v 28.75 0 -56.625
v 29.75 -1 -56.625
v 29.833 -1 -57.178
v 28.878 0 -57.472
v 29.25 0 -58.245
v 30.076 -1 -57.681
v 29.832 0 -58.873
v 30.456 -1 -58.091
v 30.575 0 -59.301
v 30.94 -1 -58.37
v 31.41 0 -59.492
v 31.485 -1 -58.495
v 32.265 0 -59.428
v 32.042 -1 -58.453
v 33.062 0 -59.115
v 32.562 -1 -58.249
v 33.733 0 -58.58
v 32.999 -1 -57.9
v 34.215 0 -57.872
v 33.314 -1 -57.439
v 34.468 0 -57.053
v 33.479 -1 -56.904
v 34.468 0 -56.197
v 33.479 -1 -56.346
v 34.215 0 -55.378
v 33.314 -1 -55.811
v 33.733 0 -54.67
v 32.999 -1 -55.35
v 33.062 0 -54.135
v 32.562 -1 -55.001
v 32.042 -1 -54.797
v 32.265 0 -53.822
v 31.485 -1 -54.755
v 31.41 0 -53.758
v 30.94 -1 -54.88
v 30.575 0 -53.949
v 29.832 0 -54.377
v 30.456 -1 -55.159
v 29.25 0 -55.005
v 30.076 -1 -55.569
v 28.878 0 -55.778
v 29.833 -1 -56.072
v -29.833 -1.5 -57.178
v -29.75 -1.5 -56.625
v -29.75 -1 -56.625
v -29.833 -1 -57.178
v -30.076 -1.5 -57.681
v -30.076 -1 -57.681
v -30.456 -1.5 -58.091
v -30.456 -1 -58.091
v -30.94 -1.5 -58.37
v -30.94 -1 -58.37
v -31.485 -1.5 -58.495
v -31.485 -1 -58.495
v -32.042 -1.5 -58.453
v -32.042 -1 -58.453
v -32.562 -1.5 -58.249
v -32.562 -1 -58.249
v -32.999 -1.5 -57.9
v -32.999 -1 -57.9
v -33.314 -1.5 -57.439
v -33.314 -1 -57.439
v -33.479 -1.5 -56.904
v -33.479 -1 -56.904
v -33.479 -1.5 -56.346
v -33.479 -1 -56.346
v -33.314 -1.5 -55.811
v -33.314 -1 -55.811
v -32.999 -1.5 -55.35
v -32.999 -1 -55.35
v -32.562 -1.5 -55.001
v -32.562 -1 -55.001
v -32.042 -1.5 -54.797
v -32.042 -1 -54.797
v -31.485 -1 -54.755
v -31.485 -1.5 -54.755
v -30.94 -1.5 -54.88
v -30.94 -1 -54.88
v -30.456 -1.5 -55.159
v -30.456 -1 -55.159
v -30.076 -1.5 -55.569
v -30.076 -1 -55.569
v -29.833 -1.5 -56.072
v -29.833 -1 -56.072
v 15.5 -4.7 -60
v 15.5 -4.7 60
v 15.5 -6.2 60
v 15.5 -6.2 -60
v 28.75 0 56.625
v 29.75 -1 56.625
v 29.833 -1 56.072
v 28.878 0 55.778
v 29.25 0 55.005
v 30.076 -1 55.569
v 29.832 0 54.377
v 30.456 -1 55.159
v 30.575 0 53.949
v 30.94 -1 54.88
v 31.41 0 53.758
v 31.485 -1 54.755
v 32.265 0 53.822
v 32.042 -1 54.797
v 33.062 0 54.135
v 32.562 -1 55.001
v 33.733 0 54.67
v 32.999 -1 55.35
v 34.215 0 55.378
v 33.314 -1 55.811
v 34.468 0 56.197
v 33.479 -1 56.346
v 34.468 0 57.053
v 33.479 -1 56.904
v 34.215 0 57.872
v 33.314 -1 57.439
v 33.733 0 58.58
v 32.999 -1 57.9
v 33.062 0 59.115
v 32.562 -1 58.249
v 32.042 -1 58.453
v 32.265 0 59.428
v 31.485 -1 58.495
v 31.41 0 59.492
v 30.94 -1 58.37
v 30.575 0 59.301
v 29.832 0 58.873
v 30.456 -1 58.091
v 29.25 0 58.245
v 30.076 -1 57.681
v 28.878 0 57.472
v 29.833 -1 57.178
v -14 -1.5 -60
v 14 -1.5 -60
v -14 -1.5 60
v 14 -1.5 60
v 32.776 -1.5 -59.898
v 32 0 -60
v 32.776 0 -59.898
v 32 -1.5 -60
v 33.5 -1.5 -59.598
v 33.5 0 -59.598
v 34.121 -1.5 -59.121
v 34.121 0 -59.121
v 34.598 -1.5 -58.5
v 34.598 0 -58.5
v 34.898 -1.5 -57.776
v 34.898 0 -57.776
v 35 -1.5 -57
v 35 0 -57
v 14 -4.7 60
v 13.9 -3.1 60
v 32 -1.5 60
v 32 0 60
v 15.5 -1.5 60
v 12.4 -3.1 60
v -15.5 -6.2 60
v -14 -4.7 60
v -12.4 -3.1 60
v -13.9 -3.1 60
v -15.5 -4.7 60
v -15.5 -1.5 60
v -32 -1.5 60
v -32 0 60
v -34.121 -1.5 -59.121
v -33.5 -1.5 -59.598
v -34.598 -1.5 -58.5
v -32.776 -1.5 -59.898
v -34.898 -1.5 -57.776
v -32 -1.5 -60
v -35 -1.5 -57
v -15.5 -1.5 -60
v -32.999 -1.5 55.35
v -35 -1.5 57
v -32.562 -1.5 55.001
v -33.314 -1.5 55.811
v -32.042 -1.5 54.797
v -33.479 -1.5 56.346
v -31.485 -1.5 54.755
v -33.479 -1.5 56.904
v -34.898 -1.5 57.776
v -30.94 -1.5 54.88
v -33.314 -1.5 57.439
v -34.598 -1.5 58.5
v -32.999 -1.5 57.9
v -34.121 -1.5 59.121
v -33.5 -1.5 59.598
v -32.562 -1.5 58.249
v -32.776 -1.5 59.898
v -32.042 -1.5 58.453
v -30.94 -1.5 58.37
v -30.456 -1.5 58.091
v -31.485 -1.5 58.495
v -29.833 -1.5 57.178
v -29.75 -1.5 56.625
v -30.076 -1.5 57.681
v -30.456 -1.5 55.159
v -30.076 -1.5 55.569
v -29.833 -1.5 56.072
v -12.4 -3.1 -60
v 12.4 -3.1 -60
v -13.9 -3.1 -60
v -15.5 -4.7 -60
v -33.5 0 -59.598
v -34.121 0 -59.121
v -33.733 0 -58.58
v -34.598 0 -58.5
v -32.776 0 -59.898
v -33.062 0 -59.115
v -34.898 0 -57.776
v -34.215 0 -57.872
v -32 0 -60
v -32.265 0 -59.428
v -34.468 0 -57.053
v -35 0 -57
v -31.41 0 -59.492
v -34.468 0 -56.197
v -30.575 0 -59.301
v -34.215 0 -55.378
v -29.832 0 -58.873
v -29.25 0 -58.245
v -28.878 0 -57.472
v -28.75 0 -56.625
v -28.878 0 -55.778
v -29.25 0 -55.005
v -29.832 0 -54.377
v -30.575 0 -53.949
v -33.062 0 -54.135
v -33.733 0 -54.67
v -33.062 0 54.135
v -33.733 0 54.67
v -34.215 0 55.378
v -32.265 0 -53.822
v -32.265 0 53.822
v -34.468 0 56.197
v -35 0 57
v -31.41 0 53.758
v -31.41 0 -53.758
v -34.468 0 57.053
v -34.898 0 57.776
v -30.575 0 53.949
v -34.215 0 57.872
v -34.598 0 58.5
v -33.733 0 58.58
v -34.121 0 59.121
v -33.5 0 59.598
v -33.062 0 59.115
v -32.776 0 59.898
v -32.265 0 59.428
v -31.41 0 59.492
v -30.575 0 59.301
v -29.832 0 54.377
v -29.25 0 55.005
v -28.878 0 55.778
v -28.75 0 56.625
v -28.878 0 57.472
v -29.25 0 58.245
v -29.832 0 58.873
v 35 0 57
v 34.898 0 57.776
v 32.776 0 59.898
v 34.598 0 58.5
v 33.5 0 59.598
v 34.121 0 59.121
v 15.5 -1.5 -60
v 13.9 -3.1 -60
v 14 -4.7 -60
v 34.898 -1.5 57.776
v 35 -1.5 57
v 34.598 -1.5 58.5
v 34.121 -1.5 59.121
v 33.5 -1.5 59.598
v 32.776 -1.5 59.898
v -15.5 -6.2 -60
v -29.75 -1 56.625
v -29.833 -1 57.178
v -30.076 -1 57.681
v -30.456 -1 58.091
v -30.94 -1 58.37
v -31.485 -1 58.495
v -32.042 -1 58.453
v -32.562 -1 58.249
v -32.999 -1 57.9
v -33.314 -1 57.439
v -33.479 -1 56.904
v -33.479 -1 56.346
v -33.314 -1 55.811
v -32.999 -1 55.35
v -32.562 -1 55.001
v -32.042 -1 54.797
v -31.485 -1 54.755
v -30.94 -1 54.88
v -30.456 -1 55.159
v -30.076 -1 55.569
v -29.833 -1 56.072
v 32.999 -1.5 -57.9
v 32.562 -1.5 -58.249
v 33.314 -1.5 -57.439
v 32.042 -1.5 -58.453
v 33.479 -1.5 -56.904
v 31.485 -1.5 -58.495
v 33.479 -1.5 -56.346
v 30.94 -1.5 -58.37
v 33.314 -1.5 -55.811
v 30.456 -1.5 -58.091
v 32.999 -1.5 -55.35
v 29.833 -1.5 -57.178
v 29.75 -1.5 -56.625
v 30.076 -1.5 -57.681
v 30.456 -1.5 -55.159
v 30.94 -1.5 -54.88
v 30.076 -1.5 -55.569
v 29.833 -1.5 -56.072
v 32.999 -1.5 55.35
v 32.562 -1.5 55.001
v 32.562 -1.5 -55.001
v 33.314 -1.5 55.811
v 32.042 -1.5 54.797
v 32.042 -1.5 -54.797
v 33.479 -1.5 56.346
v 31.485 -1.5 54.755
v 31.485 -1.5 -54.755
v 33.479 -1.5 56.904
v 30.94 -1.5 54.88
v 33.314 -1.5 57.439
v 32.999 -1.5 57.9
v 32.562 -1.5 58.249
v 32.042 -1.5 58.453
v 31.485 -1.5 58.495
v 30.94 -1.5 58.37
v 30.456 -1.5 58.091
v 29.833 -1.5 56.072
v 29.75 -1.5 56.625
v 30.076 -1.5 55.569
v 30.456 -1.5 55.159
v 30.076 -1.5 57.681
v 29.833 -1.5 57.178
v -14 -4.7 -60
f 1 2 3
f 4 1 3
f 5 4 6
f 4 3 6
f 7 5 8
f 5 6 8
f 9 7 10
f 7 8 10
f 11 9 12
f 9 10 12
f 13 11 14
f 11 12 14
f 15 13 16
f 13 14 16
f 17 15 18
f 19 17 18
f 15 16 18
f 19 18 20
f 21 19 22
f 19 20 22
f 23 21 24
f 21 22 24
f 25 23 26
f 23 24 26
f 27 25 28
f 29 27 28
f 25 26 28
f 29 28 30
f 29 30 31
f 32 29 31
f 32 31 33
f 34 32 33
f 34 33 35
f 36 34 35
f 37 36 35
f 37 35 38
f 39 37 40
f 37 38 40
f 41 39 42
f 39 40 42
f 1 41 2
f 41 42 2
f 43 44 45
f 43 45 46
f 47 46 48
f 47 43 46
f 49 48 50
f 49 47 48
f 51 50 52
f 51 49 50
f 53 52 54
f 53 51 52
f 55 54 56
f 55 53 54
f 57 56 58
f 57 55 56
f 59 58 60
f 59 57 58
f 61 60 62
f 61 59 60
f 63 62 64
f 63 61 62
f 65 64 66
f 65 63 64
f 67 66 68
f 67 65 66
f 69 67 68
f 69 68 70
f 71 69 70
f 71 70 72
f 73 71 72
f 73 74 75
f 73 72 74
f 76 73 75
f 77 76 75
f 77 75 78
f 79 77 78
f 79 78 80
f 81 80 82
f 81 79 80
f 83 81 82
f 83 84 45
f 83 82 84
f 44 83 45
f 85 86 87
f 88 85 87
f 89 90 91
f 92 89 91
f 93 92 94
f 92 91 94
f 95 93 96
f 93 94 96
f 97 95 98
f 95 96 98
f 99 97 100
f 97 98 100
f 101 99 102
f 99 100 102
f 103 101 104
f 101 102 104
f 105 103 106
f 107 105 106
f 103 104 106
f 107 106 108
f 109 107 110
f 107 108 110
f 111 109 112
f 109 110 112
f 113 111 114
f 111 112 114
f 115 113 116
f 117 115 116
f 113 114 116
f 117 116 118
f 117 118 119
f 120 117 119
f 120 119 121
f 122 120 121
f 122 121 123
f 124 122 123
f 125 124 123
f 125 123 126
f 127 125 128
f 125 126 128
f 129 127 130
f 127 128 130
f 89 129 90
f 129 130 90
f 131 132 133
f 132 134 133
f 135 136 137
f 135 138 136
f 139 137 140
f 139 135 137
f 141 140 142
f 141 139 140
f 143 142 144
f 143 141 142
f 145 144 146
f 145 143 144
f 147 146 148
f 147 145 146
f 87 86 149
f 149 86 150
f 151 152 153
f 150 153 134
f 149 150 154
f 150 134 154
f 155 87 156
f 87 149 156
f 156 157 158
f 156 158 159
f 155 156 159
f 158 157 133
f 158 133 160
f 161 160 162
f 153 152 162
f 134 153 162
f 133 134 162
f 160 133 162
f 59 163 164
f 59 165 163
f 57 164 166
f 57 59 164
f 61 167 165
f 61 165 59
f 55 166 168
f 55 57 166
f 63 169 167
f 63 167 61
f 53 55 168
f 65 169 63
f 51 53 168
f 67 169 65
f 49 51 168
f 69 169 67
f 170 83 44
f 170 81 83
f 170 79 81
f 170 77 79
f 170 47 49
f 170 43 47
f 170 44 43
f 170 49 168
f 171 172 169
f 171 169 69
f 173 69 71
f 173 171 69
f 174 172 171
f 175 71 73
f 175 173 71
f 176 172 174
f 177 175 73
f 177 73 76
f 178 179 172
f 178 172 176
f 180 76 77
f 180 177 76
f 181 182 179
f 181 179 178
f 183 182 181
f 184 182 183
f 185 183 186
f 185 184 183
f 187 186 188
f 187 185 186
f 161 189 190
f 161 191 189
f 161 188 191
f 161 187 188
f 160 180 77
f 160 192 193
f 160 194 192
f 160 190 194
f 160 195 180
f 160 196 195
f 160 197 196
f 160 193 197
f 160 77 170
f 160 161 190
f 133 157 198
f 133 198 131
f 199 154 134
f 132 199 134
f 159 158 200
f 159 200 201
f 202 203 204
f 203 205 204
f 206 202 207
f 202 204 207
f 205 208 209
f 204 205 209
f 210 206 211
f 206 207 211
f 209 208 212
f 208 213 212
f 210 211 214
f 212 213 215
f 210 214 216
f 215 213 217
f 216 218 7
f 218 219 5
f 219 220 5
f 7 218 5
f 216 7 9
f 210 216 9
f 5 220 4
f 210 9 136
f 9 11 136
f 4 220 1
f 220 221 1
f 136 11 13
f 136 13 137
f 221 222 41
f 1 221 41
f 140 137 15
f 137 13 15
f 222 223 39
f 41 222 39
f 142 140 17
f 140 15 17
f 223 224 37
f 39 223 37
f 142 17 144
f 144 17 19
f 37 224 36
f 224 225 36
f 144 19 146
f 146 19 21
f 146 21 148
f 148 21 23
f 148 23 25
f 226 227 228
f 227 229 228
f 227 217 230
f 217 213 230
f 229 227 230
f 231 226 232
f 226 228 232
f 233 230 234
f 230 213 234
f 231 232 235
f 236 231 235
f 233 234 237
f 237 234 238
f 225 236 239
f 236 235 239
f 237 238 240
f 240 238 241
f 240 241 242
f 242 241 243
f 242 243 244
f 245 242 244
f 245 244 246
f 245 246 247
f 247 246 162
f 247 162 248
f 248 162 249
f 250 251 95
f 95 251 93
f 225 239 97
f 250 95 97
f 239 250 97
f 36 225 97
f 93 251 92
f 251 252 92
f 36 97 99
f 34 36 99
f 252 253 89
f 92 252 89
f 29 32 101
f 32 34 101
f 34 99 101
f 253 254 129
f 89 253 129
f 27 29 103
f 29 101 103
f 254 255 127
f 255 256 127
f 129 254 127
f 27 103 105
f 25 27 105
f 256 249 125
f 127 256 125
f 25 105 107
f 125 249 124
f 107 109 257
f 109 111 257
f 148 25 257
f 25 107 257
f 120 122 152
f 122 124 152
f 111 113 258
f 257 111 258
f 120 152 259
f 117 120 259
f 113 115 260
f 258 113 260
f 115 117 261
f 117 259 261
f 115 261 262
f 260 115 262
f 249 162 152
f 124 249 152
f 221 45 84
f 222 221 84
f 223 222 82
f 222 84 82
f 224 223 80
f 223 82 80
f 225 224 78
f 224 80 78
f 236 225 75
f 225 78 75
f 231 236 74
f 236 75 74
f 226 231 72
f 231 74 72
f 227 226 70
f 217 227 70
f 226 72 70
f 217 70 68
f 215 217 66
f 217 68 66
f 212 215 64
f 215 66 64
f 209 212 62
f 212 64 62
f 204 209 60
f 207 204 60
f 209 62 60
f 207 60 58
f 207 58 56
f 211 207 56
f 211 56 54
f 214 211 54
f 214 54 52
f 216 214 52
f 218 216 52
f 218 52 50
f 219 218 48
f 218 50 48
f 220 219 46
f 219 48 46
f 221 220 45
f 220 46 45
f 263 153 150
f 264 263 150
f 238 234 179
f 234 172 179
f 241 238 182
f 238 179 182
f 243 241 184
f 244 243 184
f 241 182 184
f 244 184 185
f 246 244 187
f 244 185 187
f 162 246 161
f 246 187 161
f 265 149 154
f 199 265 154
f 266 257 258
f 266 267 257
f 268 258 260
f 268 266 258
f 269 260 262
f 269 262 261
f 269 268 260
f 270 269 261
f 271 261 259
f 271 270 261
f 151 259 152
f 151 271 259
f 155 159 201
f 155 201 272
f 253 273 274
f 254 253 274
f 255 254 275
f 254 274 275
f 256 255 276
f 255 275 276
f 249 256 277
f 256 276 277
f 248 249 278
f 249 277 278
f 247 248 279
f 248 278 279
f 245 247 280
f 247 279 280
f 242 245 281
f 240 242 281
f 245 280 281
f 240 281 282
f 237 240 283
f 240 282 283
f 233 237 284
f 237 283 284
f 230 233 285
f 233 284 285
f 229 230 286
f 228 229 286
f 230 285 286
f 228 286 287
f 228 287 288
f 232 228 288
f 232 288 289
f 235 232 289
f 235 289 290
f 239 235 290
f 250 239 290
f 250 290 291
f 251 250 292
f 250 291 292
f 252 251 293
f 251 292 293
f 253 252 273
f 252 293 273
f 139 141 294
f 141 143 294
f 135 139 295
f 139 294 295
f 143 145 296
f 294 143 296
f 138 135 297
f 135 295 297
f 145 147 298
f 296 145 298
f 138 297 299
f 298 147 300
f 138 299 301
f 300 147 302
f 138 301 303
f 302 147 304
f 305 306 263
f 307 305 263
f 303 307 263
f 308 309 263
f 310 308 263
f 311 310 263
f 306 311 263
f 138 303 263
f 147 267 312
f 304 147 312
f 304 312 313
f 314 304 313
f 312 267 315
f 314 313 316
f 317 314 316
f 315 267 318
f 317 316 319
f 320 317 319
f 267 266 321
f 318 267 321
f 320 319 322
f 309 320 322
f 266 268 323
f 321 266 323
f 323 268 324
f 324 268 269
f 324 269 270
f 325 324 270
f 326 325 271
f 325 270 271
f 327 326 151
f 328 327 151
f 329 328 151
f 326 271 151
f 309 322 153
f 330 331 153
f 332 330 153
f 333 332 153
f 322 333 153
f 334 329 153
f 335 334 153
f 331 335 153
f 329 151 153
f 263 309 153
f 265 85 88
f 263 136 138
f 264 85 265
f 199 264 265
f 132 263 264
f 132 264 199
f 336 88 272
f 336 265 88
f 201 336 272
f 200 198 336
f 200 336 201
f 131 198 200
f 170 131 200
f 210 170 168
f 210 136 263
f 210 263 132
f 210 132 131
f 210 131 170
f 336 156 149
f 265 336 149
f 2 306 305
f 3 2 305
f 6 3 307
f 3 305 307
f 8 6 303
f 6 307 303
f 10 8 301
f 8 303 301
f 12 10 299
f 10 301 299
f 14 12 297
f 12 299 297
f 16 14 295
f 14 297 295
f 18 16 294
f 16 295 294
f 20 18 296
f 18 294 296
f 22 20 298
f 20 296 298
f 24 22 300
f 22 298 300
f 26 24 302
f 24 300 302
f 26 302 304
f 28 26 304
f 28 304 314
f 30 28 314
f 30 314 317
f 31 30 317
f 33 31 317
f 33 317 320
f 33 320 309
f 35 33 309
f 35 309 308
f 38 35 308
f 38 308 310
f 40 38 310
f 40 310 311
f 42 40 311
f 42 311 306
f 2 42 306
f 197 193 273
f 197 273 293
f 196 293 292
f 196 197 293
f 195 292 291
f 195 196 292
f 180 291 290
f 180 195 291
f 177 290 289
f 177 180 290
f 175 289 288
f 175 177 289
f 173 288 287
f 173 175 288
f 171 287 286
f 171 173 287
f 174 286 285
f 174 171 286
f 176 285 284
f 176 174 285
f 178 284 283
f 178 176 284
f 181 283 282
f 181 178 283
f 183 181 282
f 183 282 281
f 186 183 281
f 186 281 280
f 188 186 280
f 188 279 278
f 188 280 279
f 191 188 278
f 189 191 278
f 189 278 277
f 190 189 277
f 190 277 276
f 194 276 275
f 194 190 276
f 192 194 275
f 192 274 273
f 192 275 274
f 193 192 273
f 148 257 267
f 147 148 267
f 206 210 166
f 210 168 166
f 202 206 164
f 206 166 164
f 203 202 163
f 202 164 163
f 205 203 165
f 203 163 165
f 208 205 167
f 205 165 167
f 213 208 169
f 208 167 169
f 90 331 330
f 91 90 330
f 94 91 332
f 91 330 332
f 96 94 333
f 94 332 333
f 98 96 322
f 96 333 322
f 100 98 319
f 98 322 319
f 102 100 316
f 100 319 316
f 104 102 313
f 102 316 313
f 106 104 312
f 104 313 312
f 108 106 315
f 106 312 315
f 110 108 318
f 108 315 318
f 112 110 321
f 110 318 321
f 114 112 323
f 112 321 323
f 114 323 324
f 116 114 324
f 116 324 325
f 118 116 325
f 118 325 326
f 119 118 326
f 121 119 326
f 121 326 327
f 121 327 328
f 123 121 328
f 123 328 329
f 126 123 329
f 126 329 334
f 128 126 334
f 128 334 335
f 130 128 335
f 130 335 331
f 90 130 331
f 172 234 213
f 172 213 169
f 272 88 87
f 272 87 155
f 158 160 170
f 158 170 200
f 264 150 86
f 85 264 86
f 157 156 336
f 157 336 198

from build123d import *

# Parameters (mm, degrees)
BOSS_EXTRUDE1_DEPTH = 60
CUT_EXTRUDE1_START  = -7.2
SKETCH7_R           = 1.875
CUT_EXTRUDE1_DEPTH  = 8.2
CHAMFER1_SIZE       = 1
FILLET1_R           = 3


with BuildPart() as part:
    # Sketch2 → Boss-Extrude1 (new body, symmetric)
    with BuildSketch(Plane.XY):
        Polygon((0, 0), (-35, 0), (-35, -1.5), (-15.5, -1.5), (-13.9, -3.1), (-15.5, -4.7), (-15.5, -6.2), (0, -6.2), (0, -4.7), (-14, -4.7), (-12.4, -3.1), (-14, -1.5), (0, -1.5), align=None)
    boss_extrude1 = extrude(amount=BOSS_EXTRUDE1_DEPTH, both=True)

    # Sketch7 → Cut-Extrude1 (cut)
    with BuildSketch(Plane(origin=(0, 0, 0), x_dir=(1, 0, 0), z_dir=(0, 1, 0)).offset(CUT_EXTRUDE1_START)):
        with Locations((-31.625, 56.625)):
            Circle(SKETCH7_R)
        with Locations((-31.625, -56.625)):
            Circle(SKETCH7_R)
    cut_extrude1 = extrude(amount=CUT_EXTRUDE1_DEPTH, mode=Mode.SUBTRACT)

    # Mirror1: Boss-Extrude1, Cut-Extrude1 across plane
    add(boss_extrude1.mirror(Plane(origin=(0, -4.7, 60), x_dir=(0, 0, 1), z_dir=(-1, 0, 0))))
    add(cut_extrude1.mirror(Plane(origin=(0, -4.7, 60), x_dir=(0, 0, 1), z_dir=(-1, 0, 0))), mode=Mode.SUBTRACT)

    # Chamfer1
    chamfer1_edges = [part.edges().sort_by_distance(p)[0] for p in [
        (-33.5, 0, -56.625),
        (-33.5, 0, 56.625),
        (33.5, 0, -56.625),
        (33.5, 0, 56.625),
    ]]
    chamfer(chamfer1_edges, length=CHAMFER1_SIZE)

    # Fillet1
    fillet1_edges = [part.edges().sort_by_distance(p)[0] for p in [
        (-35, -0.75, 60),
        (-35, -0.75, -60),
        (35, -0.75, 60),
        (35, -0.75, -60),
    ]]
    fillet(fillet1_edges, radius=FILLET1_R)


solid = part.part
